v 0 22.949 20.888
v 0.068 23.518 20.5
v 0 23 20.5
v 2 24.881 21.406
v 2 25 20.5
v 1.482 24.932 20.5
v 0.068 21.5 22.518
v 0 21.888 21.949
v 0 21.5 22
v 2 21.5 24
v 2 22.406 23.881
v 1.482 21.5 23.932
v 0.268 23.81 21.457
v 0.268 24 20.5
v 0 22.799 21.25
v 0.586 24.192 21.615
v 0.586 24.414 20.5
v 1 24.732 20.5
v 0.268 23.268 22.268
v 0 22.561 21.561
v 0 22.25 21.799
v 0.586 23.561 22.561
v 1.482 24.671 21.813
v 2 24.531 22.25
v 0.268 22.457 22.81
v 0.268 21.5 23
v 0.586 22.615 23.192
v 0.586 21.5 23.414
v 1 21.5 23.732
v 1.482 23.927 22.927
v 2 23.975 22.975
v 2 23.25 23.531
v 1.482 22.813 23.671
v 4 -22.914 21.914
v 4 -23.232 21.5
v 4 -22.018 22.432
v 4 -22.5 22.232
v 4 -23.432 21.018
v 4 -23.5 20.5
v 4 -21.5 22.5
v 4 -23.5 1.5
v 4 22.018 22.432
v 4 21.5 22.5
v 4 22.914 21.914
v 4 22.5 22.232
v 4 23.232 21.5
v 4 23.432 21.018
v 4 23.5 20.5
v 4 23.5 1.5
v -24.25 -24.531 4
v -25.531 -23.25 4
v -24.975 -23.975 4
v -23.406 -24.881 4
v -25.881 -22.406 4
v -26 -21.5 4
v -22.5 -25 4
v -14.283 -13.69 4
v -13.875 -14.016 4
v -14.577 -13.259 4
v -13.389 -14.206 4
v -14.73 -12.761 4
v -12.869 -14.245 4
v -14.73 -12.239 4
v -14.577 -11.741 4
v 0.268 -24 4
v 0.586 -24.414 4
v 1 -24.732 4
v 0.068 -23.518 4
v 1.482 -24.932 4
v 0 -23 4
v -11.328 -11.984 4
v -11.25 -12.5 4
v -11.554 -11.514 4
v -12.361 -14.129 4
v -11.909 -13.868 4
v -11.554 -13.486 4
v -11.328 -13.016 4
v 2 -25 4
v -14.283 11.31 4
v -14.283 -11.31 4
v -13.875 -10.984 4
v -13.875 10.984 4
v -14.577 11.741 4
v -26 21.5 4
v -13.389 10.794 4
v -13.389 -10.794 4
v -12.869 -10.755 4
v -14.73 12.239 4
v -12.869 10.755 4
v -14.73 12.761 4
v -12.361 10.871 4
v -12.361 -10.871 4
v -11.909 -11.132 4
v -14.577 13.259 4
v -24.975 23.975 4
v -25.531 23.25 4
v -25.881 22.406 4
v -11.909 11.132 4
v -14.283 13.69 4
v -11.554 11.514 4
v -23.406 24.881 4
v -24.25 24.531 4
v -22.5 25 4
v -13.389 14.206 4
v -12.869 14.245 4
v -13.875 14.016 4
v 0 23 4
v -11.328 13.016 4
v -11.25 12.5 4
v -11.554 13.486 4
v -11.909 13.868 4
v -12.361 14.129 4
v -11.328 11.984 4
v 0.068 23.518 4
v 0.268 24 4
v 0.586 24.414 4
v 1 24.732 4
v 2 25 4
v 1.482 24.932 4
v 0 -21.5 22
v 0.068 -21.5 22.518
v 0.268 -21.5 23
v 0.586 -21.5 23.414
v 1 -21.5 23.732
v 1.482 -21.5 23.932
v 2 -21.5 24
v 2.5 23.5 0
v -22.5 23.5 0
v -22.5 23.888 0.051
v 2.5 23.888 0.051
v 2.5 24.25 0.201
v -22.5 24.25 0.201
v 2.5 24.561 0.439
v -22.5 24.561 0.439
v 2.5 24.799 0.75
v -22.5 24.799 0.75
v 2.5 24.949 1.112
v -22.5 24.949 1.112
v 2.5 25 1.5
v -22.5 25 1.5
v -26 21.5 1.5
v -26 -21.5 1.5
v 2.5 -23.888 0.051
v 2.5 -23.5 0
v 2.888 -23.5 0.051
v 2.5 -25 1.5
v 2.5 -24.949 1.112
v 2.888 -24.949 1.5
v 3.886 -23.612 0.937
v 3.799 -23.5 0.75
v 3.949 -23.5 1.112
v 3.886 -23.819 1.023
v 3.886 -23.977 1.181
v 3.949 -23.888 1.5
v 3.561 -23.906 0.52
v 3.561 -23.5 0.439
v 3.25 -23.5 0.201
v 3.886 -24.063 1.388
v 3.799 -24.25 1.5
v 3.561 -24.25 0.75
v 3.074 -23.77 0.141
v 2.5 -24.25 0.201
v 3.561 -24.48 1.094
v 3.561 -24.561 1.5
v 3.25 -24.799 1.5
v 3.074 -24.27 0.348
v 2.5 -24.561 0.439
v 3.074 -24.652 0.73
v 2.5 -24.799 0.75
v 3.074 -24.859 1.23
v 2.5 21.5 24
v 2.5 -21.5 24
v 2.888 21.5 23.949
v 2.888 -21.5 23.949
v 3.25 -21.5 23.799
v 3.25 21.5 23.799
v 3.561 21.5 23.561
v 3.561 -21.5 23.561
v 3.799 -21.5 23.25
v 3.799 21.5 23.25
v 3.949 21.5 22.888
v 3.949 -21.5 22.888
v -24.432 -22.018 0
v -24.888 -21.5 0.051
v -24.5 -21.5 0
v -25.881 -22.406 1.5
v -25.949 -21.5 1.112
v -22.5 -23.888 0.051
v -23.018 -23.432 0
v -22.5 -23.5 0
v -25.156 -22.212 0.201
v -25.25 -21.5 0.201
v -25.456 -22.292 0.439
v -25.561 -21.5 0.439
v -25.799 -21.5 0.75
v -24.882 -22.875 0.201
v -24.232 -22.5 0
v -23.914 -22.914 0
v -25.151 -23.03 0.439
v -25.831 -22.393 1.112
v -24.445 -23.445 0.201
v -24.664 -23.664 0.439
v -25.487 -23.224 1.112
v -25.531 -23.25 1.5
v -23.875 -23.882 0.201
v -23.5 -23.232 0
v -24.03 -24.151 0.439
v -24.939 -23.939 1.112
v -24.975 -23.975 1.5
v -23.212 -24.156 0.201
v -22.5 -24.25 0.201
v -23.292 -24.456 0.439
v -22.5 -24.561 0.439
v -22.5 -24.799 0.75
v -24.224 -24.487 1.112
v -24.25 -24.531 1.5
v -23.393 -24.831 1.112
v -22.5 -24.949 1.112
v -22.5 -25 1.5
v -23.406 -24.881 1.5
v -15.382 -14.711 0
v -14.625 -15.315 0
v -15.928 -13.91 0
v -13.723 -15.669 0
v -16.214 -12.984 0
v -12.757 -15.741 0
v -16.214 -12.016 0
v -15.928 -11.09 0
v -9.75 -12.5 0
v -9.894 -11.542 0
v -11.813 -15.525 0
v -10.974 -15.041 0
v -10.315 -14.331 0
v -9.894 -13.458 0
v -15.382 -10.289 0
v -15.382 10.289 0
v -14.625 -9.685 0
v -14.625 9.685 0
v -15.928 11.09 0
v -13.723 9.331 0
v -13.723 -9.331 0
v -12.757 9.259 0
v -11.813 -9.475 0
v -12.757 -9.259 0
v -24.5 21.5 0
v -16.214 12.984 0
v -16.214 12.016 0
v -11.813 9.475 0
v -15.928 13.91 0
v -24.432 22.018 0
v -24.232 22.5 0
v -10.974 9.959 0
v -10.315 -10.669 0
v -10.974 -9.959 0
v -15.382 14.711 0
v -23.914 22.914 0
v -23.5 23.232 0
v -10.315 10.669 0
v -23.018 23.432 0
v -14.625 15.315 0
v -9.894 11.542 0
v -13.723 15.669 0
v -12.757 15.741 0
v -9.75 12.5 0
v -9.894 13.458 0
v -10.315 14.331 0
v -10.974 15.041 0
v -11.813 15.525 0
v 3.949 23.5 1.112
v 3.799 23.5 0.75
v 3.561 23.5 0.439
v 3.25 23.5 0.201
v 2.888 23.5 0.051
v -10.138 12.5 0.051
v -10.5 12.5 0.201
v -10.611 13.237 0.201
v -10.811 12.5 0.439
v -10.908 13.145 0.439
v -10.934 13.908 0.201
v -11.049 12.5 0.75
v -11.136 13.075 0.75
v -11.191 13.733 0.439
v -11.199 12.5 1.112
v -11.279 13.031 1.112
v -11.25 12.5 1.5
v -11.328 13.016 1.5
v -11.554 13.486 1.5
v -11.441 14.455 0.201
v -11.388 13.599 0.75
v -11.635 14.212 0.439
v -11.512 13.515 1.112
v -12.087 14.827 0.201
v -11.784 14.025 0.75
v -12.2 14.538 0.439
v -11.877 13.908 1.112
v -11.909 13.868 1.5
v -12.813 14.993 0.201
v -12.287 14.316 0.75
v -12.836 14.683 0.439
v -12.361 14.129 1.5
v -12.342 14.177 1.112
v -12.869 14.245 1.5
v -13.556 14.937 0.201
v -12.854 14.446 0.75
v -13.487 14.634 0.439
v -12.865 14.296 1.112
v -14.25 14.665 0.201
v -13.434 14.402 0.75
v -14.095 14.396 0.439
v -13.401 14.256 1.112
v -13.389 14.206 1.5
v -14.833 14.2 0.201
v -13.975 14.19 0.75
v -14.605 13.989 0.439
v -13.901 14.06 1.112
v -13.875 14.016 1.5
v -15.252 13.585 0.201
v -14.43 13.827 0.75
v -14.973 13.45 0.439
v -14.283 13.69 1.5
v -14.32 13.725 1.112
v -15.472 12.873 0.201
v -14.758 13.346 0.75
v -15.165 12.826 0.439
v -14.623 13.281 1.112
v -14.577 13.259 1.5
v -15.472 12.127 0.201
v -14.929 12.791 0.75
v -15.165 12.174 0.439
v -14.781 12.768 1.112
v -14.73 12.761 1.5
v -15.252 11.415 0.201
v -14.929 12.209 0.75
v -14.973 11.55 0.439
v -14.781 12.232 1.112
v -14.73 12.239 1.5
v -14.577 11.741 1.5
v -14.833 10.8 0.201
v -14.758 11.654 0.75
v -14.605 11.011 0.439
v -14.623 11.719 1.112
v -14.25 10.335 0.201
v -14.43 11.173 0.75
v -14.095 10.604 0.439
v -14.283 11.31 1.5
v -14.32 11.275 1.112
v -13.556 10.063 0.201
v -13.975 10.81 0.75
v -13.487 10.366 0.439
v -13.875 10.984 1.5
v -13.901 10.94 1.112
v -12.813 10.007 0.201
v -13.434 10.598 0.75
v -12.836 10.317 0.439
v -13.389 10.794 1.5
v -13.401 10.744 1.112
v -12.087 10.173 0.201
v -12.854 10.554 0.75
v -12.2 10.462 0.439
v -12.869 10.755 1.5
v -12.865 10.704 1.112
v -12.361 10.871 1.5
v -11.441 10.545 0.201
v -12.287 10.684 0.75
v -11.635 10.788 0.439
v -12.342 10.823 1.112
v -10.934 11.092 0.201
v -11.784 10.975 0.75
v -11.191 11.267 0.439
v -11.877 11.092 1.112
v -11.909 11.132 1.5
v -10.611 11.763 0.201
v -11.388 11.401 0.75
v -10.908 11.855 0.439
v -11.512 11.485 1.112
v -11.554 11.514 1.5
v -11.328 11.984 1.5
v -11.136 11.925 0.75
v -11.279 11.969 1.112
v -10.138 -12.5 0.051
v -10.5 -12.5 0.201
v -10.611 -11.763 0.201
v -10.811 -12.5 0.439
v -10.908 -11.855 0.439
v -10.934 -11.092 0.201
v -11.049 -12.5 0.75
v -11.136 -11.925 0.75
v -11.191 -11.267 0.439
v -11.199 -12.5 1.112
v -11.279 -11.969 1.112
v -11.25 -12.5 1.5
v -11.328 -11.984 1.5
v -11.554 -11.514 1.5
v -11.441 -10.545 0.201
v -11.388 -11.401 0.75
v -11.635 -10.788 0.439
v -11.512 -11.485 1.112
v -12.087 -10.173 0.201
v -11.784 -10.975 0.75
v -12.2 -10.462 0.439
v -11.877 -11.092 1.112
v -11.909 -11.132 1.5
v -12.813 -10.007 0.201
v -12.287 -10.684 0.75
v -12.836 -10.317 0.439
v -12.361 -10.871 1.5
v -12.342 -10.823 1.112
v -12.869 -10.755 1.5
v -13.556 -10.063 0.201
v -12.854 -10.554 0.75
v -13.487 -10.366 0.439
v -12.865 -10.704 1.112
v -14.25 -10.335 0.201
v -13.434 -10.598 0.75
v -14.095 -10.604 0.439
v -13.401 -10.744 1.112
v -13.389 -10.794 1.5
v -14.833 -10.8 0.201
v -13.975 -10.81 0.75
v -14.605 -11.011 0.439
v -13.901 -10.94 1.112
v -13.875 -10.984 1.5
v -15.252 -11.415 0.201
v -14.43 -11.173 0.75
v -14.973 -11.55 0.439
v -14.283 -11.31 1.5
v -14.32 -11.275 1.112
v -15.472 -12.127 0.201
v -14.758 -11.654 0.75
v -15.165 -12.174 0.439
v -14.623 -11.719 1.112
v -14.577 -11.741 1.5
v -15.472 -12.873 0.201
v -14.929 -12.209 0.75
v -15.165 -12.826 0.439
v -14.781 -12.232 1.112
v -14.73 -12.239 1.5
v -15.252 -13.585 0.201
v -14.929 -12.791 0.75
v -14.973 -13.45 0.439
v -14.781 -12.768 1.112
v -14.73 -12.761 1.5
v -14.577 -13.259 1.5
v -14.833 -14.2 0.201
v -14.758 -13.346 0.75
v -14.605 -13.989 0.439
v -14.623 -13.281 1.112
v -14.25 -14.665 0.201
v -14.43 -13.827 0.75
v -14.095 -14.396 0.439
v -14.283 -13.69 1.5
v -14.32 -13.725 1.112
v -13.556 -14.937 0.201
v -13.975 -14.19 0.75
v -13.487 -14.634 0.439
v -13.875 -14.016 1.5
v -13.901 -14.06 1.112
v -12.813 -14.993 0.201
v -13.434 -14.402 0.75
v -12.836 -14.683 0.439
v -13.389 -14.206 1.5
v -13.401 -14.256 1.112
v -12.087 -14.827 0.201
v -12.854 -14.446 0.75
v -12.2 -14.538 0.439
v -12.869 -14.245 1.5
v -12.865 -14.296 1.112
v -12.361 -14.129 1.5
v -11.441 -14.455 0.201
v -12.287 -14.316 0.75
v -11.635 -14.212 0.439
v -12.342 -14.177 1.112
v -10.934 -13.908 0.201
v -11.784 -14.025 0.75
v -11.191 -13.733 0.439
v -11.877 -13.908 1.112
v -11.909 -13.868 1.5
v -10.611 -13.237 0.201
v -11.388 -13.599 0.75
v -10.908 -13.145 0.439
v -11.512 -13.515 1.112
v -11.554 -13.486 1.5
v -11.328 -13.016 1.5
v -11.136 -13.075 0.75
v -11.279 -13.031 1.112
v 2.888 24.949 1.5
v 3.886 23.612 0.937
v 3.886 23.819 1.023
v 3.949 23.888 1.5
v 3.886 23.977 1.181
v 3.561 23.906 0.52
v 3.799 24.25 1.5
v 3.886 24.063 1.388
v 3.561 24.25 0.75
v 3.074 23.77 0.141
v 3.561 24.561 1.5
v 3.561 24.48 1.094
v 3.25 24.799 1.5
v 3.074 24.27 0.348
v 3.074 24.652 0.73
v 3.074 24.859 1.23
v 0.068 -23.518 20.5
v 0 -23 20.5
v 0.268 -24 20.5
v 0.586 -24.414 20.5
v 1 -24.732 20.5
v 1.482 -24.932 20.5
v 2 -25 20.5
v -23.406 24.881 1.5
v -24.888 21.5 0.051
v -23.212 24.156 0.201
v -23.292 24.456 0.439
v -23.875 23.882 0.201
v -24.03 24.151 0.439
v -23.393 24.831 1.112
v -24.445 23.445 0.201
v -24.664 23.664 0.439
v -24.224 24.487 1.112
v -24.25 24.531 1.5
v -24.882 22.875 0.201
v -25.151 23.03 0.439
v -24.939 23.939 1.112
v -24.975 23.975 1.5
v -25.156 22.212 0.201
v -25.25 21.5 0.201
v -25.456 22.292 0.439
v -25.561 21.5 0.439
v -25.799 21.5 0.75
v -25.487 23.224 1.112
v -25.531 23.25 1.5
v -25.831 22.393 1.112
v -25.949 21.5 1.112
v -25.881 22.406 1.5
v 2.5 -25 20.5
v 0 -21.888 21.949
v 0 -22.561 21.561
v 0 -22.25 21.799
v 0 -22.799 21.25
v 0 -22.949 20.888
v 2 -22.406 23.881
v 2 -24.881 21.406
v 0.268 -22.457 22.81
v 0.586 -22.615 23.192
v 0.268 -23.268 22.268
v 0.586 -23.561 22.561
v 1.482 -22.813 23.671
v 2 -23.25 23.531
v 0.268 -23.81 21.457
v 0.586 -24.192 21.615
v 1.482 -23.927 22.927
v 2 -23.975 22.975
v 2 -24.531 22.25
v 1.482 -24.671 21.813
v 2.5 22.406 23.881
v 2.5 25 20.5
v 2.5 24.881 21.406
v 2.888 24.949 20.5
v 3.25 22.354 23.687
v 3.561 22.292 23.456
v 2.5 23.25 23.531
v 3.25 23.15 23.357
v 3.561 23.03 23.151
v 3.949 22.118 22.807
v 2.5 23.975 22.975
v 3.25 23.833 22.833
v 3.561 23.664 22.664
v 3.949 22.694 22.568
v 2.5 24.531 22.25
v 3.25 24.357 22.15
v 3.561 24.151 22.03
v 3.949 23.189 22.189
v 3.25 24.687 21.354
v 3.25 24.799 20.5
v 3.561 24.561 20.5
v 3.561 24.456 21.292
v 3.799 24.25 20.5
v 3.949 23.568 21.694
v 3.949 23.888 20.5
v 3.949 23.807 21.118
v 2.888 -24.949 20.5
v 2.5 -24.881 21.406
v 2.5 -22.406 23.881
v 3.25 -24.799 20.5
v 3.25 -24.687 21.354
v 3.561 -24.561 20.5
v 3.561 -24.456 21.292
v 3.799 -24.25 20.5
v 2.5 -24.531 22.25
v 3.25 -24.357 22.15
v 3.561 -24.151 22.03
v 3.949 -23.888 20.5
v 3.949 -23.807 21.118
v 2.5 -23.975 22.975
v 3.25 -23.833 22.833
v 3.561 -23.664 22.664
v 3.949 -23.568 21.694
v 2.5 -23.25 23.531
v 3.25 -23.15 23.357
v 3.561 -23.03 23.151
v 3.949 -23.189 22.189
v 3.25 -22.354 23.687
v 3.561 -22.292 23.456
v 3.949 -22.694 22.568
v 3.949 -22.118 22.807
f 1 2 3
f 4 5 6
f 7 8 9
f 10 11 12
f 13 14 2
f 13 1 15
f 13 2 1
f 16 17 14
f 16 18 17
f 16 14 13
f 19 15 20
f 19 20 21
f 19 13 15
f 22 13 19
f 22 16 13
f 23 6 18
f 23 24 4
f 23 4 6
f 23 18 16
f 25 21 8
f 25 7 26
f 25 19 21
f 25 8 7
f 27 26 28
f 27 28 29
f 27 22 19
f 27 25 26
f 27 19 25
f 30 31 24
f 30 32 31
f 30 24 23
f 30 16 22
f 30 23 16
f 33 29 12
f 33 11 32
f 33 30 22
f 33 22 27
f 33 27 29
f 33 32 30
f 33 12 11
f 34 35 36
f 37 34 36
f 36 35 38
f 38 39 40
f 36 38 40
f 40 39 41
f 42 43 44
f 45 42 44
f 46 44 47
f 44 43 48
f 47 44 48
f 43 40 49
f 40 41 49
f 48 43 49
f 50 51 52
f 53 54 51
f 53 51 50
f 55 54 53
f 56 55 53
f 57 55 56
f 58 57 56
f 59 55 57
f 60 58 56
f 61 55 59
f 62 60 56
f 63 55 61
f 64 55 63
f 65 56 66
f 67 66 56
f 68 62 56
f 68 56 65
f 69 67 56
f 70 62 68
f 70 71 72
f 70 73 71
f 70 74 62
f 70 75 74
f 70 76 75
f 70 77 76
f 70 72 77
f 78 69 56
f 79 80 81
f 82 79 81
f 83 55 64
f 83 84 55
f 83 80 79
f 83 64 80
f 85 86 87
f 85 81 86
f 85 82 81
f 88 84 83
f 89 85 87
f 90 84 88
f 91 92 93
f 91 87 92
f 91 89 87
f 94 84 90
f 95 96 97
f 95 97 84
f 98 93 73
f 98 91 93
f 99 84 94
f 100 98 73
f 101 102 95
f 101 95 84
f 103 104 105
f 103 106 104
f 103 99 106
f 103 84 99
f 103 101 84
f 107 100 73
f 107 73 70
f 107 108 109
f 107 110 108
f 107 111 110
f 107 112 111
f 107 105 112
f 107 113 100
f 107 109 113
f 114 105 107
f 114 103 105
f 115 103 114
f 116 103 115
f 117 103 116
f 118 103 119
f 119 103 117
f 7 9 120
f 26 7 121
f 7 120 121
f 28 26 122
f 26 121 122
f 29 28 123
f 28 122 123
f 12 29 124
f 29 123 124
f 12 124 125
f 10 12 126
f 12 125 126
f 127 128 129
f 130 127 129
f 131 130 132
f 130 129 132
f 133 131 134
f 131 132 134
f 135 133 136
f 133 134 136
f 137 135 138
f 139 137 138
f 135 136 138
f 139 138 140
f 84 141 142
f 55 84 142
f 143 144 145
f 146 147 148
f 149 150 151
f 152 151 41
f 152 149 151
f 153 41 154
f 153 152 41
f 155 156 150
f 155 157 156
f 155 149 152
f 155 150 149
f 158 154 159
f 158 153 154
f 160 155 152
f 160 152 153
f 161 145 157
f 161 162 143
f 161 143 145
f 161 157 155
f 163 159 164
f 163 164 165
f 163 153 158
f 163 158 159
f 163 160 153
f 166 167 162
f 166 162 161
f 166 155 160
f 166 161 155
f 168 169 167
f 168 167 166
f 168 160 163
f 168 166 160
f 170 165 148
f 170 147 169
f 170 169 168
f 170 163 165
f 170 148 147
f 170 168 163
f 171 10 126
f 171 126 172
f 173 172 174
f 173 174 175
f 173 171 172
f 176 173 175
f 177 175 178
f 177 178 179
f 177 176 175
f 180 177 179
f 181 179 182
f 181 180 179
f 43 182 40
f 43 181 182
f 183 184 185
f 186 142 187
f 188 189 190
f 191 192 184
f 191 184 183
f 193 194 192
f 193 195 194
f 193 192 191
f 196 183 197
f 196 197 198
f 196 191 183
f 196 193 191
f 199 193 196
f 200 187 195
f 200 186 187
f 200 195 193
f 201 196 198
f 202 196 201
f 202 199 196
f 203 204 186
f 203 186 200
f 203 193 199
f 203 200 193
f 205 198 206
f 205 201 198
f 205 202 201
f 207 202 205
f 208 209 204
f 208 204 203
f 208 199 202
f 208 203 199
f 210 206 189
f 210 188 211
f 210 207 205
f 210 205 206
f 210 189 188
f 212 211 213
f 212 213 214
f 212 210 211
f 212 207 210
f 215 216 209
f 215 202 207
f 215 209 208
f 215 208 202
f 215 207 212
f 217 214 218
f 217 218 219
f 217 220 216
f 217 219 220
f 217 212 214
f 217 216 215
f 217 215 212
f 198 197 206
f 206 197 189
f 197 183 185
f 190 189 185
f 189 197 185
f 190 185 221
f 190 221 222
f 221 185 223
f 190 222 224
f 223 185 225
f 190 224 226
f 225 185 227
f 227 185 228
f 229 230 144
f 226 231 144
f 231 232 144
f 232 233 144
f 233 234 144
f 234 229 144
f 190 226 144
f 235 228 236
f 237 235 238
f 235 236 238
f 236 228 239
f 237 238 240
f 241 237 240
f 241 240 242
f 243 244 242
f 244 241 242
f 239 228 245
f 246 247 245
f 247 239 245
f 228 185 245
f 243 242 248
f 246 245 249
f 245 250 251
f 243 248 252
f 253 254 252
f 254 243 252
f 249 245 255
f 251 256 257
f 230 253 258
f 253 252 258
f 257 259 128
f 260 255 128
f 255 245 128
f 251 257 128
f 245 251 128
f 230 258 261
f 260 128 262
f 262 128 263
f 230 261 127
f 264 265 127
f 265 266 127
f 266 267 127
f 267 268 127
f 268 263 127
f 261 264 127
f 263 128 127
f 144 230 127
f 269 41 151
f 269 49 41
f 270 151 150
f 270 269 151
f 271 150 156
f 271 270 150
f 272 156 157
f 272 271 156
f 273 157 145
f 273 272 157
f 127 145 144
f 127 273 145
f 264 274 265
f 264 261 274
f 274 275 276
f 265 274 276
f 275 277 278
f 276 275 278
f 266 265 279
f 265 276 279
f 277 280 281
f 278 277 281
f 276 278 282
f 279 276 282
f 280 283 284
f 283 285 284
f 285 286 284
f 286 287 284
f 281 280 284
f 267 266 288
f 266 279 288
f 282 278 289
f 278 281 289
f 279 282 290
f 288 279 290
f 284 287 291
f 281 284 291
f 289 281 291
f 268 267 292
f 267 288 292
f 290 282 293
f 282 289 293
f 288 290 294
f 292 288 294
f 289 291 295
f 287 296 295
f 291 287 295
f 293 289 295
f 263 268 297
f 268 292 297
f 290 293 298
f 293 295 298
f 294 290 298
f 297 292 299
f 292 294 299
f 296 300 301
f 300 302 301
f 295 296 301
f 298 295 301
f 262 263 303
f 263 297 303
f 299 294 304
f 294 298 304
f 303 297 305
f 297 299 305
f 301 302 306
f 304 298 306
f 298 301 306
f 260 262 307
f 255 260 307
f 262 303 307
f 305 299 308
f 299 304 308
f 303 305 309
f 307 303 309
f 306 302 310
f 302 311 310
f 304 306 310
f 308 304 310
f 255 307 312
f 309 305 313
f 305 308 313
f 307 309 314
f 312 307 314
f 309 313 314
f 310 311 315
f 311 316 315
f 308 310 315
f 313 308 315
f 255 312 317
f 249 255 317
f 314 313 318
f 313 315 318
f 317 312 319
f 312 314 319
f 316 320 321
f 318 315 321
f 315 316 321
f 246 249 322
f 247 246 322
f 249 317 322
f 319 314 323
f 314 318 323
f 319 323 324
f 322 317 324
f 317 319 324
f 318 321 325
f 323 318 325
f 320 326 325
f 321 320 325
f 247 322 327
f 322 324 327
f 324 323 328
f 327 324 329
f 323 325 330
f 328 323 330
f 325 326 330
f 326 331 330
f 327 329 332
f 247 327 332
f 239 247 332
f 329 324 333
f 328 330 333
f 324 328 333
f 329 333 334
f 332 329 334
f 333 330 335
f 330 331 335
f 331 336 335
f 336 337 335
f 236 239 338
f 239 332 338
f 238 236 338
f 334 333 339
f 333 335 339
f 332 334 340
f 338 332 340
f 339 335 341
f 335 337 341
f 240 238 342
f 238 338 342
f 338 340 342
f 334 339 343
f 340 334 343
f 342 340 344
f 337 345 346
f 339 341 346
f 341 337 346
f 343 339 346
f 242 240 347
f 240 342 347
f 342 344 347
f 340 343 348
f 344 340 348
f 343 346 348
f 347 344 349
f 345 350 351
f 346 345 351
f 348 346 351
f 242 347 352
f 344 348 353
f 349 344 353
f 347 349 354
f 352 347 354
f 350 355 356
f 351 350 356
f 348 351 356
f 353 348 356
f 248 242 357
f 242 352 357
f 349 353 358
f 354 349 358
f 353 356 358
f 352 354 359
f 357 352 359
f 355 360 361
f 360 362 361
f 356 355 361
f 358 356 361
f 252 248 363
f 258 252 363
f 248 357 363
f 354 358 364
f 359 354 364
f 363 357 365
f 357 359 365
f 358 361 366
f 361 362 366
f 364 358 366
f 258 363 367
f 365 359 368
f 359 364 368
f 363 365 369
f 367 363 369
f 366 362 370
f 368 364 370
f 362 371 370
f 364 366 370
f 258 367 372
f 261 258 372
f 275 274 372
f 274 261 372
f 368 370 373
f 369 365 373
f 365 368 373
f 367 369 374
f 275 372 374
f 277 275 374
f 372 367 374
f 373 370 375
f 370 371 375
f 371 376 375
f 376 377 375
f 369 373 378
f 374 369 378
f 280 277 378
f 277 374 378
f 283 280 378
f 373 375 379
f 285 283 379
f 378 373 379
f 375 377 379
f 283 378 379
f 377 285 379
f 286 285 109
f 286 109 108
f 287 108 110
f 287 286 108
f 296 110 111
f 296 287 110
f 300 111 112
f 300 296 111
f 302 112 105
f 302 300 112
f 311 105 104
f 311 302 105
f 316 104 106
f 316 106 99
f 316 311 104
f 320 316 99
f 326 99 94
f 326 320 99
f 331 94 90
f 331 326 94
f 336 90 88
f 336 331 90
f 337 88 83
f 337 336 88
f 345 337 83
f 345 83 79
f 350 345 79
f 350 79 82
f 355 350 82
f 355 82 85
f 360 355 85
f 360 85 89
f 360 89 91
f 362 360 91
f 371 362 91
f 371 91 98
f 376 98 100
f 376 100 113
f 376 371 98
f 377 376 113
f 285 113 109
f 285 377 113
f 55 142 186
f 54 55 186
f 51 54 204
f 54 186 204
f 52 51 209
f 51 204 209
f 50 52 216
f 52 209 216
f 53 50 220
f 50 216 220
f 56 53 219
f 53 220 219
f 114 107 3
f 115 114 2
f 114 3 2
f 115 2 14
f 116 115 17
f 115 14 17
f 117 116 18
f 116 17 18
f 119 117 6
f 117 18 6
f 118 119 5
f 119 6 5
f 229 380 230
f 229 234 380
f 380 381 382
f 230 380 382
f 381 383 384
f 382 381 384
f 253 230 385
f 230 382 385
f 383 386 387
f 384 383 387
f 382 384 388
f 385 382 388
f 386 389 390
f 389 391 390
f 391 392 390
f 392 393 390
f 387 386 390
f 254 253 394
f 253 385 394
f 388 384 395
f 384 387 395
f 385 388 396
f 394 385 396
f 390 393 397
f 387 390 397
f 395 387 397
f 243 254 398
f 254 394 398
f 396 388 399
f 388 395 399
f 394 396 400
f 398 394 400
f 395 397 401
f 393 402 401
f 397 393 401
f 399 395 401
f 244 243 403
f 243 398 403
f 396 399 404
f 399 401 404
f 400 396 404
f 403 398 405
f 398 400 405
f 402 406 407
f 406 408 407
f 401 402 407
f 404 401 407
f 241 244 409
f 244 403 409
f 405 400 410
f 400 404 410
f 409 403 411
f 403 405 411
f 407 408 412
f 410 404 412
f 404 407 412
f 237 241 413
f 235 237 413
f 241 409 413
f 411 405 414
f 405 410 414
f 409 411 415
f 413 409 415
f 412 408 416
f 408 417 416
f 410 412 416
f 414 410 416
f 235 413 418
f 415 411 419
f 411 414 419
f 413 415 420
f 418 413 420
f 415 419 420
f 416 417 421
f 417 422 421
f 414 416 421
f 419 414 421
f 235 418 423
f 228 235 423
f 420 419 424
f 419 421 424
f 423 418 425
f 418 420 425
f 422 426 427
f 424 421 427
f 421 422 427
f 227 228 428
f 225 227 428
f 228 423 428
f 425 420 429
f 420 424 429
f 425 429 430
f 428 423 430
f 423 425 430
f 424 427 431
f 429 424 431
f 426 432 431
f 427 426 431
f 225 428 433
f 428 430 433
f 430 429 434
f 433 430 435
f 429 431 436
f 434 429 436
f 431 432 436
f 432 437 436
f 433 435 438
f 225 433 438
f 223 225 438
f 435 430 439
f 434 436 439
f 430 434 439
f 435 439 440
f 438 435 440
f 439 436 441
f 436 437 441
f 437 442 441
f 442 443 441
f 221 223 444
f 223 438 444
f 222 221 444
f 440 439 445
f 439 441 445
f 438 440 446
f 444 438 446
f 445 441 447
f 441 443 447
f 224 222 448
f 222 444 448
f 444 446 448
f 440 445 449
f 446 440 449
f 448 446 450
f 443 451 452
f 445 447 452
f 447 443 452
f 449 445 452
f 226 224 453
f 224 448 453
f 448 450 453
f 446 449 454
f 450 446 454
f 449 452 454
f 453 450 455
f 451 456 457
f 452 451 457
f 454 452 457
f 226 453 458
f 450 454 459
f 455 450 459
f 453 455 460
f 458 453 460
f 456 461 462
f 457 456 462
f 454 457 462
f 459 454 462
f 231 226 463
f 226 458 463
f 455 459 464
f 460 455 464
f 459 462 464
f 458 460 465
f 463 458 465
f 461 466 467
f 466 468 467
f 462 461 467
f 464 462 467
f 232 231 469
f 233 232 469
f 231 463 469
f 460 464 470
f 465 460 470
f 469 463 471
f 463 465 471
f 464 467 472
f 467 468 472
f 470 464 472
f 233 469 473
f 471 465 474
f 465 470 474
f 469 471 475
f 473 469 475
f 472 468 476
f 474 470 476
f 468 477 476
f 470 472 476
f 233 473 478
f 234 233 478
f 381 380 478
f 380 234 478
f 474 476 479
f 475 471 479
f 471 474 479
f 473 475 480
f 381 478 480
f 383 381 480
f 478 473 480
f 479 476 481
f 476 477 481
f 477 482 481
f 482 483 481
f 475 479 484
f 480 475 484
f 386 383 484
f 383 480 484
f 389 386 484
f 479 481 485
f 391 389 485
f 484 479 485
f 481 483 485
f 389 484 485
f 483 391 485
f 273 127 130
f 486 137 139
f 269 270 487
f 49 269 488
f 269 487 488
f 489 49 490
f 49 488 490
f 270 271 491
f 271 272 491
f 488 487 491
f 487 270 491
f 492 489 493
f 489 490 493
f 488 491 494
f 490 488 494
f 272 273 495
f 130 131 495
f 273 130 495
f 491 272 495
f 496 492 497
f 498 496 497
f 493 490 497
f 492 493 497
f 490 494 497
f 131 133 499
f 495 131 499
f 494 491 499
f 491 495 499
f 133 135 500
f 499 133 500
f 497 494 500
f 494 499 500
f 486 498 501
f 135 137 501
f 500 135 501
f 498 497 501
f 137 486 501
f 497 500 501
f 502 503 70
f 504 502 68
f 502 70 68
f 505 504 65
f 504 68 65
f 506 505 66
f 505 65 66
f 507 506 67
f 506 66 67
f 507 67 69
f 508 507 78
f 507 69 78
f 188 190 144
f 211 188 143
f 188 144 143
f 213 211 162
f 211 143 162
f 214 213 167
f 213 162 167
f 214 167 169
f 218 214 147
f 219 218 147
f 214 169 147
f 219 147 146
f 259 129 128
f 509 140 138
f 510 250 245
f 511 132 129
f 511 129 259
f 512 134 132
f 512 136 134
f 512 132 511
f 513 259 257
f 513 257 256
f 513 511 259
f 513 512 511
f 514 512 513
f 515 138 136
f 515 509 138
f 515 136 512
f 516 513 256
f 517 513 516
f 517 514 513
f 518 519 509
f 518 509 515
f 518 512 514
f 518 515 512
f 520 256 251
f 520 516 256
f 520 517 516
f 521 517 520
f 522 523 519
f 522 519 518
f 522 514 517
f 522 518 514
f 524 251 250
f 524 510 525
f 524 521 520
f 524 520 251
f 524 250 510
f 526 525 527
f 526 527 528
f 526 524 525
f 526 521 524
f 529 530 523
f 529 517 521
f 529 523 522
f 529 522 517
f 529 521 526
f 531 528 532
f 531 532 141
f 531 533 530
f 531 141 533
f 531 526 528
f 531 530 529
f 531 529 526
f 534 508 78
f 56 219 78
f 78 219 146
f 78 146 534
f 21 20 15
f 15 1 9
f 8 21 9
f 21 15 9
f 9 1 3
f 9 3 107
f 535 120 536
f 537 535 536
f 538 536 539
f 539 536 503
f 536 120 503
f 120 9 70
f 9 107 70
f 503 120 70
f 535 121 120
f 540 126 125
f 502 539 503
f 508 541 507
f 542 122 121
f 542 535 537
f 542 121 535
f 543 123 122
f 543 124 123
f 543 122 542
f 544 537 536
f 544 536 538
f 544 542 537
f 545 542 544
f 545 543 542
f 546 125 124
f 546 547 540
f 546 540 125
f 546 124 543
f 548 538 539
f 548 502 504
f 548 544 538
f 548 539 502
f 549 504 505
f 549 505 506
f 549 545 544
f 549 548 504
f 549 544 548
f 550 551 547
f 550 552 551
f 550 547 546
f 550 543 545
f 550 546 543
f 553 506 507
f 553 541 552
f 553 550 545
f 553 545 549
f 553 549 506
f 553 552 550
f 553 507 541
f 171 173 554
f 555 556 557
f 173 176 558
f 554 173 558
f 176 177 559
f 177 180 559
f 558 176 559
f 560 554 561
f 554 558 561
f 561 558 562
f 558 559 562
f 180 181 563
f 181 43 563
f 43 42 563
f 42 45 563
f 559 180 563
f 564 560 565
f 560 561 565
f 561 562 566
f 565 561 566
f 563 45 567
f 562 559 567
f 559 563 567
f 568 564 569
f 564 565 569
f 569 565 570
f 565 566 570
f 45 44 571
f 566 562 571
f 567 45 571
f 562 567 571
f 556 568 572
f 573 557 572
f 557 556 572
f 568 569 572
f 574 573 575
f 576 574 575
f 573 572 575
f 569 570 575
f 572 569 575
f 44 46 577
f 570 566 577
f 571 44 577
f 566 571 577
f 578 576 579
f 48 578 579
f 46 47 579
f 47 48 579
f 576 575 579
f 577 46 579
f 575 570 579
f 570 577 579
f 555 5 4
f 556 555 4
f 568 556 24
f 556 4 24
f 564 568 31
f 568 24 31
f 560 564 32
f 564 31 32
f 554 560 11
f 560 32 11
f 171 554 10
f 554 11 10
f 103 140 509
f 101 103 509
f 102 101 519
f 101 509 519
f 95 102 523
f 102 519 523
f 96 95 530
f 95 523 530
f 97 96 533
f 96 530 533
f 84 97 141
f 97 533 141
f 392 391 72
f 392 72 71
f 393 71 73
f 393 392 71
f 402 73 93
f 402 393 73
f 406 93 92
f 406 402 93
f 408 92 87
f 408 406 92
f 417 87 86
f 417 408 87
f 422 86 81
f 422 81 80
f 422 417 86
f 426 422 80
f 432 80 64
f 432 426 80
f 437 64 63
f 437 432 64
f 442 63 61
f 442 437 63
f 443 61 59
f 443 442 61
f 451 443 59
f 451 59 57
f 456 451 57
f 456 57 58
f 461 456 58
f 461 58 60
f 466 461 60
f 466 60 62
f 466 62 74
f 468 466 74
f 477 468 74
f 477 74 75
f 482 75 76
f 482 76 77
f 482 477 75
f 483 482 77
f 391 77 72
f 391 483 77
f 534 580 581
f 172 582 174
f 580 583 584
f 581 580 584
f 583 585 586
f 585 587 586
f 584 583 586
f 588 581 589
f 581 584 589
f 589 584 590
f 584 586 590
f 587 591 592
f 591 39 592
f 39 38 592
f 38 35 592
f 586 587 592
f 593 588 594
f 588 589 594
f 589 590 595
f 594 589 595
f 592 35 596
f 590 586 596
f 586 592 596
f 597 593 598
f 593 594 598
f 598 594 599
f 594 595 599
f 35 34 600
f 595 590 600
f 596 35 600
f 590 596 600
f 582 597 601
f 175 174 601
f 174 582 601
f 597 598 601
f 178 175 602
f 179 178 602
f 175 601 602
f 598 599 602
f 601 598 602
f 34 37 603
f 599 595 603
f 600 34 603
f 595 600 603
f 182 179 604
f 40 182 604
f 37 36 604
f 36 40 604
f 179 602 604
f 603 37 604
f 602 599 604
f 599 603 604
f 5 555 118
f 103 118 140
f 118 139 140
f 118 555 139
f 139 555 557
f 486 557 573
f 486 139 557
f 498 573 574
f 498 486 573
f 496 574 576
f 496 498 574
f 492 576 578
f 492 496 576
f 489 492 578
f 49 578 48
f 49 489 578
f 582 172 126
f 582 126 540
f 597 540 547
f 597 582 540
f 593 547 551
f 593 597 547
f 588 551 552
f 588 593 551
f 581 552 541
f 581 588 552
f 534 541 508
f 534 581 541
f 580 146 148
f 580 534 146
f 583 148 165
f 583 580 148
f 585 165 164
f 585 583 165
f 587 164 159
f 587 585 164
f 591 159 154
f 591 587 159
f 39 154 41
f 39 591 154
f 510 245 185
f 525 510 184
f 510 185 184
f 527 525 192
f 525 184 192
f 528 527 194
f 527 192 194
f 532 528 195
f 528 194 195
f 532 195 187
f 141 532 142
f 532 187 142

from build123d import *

# Parameters (mm, degrees)
F0_R     = 1.75
F1_DEPTH = 4
F2_DEPTH = 24
F3_R     = 3.5
F4_R     = 1.5
F5_R     = 2


with BuildPart() as f1:
    # F0 (on Top) → F1 (new body)
    with BuildSketch(Plane.XY):
        with BuildLine():
            Line((-26, 0), (0, 0))
            Line((0, 0), (0, 25))
            Line((0, 25), (-22.5, 25))
            ThreePointArc((-22.5, 25), (-24.974874, 23.974874), (-26, 21.5))
            Line((-26, 21.5), (-26, 0))
        make_face()
        with Locations((-13, 12.5)):
            Circle(F0_R, mode=Mode.SUBTRACT)
        with BuildLine():
            Line((0, -25), (0, 0))
            Line((0, 0), (-26, 0))
            Line((-26, 0), (-26, -21.5))
            ThreePointArc((-26, -21.5), (-24.974874, -23.974874), (-22.5, -25))
            Line((-22.5, -25), (0, -25))
        make_face()
        with Locations((-13, -12.5)):
            Circle(F0_R, mode=Mode.SUBTRACT)
    extrude(amount=F1_DEPTH)

    # F0 (on Top) → F2 (join)
    with BuildSketch(Plane.XY):
        Polygon((0, 25), (0, 0), (0, -25), (4, -25), (4, 25), align=None)
    extrude(amount=F2_DEPTH)

    # F3
    f3_edges = [f1.edges().sort_by_distance(p)[0] for p in [
        (2, 25, 24),
        (2, -25, 24),
    ]]
    fillet(f3_edges, radius=F3_R)

    # F4
    f4_edges = [f1.edges().sort_by_distance(p)[0] for p in [
        (-24.974874, 23.974874, 0),
        (-26, 0, 0),
        (-24.974874, -23.974874, 0),
        (-9.25, -25, 0),
        (4, 0, 0),
        (-9.25, 25, 0),
        (-14.75, 12.5, 0),
        (-14.75, -12.5, 0),
        (4, -25, 10.25),
        (4, -23.974874, 22.974874),
        (4, 0, 24),
        (4, 25, 10.25),
        (4, 23.974874, 22.974874),
    ]]
    fillet(f4_edges, radius=F4_R)

    # F5
    f5_edges = [f1.edges().sort_by_distance(p)[0] for p in [
        (0, 0, 24),
        (0, -25, 12.25),
        (0, 25, 12.25),
    ]]
    fillet(f5_edges, radius=F5_R)


solid = f1.part
